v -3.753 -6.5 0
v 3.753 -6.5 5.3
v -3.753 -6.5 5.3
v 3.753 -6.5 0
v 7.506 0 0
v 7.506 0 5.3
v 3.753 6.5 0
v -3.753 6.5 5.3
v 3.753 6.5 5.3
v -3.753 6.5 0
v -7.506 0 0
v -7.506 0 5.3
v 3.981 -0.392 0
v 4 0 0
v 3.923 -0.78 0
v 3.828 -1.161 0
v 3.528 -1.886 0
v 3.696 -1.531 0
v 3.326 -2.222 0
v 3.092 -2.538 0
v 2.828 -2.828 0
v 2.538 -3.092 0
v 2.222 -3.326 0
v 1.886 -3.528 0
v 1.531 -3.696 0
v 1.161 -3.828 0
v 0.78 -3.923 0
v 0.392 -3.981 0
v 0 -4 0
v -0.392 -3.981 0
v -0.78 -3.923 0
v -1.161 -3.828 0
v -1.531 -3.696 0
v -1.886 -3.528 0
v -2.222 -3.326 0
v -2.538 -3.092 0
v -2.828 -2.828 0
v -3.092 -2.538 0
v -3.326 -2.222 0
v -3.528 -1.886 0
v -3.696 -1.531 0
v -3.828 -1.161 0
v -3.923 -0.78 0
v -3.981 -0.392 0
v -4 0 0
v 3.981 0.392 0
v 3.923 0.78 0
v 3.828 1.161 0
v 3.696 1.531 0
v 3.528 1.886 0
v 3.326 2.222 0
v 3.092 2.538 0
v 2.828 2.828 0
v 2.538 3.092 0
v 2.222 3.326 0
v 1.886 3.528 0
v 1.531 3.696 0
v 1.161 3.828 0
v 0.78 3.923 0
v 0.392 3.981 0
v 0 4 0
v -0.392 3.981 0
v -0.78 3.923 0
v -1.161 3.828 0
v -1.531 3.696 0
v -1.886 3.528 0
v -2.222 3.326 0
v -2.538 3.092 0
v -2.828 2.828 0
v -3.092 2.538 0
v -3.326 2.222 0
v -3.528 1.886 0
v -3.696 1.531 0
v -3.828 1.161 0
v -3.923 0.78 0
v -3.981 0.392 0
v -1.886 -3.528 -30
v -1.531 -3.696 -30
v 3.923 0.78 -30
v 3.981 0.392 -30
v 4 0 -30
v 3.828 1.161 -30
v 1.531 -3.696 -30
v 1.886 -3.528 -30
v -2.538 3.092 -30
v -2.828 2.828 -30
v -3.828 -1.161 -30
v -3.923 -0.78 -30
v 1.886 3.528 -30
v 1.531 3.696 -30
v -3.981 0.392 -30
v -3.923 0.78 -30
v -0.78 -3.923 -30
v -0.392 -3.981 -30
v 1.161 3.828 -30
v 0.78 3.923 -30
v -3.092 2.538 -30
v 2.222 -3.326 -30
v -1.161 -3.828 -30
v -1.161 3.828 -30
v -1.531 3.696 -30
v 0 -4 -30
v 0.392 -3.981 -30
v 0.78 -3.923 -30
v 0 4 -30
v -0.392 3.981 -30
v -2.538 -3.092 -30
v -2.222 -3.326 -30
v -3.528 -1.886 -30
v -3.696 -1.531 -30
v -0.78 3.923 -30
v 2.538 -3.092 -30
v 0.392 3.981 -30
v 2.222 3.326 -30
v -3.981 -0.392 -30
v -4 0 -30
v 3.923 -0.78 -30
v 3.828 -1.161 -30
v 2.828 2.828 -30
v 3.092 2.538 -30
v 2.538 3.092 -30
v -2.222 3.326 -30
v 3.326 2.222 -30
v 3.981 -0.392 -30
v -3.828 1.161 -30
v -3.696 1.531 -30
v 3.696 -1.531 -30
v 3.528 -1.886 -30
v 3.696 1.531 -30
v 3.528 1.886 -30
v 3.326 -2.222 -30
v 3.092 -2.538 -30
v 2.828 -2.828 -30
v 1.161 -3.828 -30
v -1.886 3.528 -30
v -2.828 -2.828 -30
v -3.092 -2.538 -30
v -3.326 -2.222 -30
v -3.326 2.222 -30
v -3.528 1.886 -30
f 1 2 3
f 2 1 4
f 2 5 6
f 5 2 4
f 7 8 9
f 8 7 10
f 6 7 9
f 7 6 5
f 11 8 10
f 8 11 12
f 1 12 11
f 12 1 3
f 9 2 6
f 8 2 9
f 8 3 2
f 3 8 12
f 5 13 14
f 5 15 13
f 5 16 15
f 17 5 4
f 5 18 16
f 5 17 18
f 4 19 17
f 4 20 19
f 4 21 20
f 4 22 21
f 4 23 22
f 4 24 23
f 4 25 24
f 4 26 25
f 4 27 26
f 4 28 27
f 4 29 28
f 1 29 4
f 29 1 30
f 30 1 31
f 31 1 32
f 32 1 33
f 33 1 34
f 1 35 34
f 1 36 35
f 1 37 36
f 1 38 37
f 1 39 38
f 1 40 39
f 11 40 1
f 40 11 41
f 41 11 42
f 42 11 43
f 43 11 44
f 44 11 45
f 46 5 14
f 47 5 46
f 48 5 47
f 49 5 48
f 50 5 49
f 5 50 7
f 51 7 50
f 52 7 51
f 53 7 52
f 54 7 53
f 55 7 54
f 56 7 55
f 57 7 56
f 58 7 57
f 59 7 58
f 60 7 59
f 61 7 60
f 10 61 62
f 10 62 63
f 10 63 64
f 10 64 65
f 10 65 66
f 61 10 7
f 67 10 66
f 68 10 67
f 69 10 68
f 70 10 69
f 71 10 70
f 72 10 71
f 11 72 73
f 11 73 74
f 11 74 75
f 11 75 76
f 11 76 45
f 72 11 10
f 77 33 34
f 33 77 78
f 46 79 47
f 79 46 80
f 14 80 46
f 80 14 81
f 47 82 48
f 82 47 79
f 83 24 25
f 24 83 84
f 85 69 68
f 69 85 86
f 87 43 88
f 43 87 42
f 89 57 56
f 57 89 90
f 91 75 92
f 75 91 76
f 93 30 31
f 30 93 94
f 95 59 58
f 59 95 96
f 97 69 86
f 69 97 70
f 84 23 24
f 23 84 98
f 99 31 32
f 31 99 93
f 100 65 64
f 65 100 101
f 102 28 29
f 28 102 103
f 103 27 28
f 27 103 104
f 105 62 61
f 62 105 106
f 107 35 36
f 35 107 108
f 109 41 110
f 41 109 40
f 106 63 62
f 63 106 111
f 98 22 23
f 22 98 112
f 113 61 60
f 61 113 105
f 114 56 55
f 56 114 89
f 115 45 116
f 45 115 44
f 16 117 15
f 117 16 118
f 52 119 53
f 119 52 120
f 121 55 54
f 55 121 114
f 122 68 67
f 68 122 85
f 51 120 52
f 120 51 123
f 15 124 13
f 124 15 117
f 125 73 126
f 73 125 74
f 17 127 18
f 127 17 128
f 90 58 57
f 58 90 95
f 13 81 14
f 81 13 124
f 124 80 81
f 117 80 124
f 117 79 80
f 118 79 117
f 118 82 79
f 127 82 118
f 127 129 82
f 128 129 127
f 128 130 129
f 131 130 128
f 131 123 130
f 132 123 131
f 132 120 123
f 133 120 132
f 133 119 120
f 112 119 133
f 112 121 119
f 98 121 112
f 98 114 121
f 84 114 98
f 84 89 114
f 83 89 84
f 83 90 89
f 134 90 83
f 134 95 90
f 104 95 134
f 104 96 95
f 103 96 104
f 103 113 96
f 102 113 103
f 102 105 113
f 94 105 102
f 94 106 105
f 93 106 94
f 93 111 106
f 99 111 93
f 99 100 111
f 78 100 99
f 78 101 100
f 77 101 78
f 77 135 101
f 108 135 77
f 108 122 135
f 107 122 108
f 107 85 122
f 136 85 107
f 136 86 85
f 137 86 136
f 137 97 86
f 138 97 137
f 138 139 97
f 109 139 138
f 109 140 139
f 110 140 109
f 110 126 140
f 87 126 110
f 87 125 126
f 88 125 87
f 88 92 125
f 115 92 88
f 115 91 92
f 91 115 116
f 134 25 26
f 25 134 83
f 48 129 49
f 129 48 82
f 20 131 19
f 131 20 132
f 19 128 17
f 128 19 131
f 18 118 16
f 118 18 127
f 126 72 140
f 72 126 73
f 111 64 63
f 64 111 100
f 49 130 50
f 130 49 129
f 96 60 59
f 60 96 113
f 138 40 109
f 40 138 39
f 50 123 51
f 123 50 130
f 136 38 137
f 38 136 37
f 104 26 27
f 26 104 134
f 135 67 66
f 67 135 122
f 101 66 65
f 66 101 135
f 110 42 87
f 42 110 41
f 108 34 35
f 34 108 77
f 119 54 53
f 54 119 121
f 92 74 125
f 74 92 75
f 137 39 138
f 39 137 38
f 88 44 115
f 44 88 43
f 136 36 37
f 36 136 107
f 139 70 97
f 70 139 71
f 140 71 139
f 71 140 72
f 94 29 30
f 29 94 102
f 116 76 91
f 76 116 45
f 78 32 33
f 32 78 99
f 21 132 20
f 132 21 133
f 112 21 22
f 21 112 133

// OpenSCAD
// M8 六角ボルト (ねじ山省略モデル)

$fn = 64;

// 頭部 (六角柱)
// 対辺距離(across-flats) 13mm
// 外接円半径 = 13 / sqrt(3)
cylinder(r = 13 / sqrt(3), h = 5.3, $fn = 6);

// シャンク (円柱)
// 直径 8mm (半径 4mm)、長さ 30mm、Z<0側へ配置
translate([0, 0, -30])
    cylinder(r = 4, h = 30);
